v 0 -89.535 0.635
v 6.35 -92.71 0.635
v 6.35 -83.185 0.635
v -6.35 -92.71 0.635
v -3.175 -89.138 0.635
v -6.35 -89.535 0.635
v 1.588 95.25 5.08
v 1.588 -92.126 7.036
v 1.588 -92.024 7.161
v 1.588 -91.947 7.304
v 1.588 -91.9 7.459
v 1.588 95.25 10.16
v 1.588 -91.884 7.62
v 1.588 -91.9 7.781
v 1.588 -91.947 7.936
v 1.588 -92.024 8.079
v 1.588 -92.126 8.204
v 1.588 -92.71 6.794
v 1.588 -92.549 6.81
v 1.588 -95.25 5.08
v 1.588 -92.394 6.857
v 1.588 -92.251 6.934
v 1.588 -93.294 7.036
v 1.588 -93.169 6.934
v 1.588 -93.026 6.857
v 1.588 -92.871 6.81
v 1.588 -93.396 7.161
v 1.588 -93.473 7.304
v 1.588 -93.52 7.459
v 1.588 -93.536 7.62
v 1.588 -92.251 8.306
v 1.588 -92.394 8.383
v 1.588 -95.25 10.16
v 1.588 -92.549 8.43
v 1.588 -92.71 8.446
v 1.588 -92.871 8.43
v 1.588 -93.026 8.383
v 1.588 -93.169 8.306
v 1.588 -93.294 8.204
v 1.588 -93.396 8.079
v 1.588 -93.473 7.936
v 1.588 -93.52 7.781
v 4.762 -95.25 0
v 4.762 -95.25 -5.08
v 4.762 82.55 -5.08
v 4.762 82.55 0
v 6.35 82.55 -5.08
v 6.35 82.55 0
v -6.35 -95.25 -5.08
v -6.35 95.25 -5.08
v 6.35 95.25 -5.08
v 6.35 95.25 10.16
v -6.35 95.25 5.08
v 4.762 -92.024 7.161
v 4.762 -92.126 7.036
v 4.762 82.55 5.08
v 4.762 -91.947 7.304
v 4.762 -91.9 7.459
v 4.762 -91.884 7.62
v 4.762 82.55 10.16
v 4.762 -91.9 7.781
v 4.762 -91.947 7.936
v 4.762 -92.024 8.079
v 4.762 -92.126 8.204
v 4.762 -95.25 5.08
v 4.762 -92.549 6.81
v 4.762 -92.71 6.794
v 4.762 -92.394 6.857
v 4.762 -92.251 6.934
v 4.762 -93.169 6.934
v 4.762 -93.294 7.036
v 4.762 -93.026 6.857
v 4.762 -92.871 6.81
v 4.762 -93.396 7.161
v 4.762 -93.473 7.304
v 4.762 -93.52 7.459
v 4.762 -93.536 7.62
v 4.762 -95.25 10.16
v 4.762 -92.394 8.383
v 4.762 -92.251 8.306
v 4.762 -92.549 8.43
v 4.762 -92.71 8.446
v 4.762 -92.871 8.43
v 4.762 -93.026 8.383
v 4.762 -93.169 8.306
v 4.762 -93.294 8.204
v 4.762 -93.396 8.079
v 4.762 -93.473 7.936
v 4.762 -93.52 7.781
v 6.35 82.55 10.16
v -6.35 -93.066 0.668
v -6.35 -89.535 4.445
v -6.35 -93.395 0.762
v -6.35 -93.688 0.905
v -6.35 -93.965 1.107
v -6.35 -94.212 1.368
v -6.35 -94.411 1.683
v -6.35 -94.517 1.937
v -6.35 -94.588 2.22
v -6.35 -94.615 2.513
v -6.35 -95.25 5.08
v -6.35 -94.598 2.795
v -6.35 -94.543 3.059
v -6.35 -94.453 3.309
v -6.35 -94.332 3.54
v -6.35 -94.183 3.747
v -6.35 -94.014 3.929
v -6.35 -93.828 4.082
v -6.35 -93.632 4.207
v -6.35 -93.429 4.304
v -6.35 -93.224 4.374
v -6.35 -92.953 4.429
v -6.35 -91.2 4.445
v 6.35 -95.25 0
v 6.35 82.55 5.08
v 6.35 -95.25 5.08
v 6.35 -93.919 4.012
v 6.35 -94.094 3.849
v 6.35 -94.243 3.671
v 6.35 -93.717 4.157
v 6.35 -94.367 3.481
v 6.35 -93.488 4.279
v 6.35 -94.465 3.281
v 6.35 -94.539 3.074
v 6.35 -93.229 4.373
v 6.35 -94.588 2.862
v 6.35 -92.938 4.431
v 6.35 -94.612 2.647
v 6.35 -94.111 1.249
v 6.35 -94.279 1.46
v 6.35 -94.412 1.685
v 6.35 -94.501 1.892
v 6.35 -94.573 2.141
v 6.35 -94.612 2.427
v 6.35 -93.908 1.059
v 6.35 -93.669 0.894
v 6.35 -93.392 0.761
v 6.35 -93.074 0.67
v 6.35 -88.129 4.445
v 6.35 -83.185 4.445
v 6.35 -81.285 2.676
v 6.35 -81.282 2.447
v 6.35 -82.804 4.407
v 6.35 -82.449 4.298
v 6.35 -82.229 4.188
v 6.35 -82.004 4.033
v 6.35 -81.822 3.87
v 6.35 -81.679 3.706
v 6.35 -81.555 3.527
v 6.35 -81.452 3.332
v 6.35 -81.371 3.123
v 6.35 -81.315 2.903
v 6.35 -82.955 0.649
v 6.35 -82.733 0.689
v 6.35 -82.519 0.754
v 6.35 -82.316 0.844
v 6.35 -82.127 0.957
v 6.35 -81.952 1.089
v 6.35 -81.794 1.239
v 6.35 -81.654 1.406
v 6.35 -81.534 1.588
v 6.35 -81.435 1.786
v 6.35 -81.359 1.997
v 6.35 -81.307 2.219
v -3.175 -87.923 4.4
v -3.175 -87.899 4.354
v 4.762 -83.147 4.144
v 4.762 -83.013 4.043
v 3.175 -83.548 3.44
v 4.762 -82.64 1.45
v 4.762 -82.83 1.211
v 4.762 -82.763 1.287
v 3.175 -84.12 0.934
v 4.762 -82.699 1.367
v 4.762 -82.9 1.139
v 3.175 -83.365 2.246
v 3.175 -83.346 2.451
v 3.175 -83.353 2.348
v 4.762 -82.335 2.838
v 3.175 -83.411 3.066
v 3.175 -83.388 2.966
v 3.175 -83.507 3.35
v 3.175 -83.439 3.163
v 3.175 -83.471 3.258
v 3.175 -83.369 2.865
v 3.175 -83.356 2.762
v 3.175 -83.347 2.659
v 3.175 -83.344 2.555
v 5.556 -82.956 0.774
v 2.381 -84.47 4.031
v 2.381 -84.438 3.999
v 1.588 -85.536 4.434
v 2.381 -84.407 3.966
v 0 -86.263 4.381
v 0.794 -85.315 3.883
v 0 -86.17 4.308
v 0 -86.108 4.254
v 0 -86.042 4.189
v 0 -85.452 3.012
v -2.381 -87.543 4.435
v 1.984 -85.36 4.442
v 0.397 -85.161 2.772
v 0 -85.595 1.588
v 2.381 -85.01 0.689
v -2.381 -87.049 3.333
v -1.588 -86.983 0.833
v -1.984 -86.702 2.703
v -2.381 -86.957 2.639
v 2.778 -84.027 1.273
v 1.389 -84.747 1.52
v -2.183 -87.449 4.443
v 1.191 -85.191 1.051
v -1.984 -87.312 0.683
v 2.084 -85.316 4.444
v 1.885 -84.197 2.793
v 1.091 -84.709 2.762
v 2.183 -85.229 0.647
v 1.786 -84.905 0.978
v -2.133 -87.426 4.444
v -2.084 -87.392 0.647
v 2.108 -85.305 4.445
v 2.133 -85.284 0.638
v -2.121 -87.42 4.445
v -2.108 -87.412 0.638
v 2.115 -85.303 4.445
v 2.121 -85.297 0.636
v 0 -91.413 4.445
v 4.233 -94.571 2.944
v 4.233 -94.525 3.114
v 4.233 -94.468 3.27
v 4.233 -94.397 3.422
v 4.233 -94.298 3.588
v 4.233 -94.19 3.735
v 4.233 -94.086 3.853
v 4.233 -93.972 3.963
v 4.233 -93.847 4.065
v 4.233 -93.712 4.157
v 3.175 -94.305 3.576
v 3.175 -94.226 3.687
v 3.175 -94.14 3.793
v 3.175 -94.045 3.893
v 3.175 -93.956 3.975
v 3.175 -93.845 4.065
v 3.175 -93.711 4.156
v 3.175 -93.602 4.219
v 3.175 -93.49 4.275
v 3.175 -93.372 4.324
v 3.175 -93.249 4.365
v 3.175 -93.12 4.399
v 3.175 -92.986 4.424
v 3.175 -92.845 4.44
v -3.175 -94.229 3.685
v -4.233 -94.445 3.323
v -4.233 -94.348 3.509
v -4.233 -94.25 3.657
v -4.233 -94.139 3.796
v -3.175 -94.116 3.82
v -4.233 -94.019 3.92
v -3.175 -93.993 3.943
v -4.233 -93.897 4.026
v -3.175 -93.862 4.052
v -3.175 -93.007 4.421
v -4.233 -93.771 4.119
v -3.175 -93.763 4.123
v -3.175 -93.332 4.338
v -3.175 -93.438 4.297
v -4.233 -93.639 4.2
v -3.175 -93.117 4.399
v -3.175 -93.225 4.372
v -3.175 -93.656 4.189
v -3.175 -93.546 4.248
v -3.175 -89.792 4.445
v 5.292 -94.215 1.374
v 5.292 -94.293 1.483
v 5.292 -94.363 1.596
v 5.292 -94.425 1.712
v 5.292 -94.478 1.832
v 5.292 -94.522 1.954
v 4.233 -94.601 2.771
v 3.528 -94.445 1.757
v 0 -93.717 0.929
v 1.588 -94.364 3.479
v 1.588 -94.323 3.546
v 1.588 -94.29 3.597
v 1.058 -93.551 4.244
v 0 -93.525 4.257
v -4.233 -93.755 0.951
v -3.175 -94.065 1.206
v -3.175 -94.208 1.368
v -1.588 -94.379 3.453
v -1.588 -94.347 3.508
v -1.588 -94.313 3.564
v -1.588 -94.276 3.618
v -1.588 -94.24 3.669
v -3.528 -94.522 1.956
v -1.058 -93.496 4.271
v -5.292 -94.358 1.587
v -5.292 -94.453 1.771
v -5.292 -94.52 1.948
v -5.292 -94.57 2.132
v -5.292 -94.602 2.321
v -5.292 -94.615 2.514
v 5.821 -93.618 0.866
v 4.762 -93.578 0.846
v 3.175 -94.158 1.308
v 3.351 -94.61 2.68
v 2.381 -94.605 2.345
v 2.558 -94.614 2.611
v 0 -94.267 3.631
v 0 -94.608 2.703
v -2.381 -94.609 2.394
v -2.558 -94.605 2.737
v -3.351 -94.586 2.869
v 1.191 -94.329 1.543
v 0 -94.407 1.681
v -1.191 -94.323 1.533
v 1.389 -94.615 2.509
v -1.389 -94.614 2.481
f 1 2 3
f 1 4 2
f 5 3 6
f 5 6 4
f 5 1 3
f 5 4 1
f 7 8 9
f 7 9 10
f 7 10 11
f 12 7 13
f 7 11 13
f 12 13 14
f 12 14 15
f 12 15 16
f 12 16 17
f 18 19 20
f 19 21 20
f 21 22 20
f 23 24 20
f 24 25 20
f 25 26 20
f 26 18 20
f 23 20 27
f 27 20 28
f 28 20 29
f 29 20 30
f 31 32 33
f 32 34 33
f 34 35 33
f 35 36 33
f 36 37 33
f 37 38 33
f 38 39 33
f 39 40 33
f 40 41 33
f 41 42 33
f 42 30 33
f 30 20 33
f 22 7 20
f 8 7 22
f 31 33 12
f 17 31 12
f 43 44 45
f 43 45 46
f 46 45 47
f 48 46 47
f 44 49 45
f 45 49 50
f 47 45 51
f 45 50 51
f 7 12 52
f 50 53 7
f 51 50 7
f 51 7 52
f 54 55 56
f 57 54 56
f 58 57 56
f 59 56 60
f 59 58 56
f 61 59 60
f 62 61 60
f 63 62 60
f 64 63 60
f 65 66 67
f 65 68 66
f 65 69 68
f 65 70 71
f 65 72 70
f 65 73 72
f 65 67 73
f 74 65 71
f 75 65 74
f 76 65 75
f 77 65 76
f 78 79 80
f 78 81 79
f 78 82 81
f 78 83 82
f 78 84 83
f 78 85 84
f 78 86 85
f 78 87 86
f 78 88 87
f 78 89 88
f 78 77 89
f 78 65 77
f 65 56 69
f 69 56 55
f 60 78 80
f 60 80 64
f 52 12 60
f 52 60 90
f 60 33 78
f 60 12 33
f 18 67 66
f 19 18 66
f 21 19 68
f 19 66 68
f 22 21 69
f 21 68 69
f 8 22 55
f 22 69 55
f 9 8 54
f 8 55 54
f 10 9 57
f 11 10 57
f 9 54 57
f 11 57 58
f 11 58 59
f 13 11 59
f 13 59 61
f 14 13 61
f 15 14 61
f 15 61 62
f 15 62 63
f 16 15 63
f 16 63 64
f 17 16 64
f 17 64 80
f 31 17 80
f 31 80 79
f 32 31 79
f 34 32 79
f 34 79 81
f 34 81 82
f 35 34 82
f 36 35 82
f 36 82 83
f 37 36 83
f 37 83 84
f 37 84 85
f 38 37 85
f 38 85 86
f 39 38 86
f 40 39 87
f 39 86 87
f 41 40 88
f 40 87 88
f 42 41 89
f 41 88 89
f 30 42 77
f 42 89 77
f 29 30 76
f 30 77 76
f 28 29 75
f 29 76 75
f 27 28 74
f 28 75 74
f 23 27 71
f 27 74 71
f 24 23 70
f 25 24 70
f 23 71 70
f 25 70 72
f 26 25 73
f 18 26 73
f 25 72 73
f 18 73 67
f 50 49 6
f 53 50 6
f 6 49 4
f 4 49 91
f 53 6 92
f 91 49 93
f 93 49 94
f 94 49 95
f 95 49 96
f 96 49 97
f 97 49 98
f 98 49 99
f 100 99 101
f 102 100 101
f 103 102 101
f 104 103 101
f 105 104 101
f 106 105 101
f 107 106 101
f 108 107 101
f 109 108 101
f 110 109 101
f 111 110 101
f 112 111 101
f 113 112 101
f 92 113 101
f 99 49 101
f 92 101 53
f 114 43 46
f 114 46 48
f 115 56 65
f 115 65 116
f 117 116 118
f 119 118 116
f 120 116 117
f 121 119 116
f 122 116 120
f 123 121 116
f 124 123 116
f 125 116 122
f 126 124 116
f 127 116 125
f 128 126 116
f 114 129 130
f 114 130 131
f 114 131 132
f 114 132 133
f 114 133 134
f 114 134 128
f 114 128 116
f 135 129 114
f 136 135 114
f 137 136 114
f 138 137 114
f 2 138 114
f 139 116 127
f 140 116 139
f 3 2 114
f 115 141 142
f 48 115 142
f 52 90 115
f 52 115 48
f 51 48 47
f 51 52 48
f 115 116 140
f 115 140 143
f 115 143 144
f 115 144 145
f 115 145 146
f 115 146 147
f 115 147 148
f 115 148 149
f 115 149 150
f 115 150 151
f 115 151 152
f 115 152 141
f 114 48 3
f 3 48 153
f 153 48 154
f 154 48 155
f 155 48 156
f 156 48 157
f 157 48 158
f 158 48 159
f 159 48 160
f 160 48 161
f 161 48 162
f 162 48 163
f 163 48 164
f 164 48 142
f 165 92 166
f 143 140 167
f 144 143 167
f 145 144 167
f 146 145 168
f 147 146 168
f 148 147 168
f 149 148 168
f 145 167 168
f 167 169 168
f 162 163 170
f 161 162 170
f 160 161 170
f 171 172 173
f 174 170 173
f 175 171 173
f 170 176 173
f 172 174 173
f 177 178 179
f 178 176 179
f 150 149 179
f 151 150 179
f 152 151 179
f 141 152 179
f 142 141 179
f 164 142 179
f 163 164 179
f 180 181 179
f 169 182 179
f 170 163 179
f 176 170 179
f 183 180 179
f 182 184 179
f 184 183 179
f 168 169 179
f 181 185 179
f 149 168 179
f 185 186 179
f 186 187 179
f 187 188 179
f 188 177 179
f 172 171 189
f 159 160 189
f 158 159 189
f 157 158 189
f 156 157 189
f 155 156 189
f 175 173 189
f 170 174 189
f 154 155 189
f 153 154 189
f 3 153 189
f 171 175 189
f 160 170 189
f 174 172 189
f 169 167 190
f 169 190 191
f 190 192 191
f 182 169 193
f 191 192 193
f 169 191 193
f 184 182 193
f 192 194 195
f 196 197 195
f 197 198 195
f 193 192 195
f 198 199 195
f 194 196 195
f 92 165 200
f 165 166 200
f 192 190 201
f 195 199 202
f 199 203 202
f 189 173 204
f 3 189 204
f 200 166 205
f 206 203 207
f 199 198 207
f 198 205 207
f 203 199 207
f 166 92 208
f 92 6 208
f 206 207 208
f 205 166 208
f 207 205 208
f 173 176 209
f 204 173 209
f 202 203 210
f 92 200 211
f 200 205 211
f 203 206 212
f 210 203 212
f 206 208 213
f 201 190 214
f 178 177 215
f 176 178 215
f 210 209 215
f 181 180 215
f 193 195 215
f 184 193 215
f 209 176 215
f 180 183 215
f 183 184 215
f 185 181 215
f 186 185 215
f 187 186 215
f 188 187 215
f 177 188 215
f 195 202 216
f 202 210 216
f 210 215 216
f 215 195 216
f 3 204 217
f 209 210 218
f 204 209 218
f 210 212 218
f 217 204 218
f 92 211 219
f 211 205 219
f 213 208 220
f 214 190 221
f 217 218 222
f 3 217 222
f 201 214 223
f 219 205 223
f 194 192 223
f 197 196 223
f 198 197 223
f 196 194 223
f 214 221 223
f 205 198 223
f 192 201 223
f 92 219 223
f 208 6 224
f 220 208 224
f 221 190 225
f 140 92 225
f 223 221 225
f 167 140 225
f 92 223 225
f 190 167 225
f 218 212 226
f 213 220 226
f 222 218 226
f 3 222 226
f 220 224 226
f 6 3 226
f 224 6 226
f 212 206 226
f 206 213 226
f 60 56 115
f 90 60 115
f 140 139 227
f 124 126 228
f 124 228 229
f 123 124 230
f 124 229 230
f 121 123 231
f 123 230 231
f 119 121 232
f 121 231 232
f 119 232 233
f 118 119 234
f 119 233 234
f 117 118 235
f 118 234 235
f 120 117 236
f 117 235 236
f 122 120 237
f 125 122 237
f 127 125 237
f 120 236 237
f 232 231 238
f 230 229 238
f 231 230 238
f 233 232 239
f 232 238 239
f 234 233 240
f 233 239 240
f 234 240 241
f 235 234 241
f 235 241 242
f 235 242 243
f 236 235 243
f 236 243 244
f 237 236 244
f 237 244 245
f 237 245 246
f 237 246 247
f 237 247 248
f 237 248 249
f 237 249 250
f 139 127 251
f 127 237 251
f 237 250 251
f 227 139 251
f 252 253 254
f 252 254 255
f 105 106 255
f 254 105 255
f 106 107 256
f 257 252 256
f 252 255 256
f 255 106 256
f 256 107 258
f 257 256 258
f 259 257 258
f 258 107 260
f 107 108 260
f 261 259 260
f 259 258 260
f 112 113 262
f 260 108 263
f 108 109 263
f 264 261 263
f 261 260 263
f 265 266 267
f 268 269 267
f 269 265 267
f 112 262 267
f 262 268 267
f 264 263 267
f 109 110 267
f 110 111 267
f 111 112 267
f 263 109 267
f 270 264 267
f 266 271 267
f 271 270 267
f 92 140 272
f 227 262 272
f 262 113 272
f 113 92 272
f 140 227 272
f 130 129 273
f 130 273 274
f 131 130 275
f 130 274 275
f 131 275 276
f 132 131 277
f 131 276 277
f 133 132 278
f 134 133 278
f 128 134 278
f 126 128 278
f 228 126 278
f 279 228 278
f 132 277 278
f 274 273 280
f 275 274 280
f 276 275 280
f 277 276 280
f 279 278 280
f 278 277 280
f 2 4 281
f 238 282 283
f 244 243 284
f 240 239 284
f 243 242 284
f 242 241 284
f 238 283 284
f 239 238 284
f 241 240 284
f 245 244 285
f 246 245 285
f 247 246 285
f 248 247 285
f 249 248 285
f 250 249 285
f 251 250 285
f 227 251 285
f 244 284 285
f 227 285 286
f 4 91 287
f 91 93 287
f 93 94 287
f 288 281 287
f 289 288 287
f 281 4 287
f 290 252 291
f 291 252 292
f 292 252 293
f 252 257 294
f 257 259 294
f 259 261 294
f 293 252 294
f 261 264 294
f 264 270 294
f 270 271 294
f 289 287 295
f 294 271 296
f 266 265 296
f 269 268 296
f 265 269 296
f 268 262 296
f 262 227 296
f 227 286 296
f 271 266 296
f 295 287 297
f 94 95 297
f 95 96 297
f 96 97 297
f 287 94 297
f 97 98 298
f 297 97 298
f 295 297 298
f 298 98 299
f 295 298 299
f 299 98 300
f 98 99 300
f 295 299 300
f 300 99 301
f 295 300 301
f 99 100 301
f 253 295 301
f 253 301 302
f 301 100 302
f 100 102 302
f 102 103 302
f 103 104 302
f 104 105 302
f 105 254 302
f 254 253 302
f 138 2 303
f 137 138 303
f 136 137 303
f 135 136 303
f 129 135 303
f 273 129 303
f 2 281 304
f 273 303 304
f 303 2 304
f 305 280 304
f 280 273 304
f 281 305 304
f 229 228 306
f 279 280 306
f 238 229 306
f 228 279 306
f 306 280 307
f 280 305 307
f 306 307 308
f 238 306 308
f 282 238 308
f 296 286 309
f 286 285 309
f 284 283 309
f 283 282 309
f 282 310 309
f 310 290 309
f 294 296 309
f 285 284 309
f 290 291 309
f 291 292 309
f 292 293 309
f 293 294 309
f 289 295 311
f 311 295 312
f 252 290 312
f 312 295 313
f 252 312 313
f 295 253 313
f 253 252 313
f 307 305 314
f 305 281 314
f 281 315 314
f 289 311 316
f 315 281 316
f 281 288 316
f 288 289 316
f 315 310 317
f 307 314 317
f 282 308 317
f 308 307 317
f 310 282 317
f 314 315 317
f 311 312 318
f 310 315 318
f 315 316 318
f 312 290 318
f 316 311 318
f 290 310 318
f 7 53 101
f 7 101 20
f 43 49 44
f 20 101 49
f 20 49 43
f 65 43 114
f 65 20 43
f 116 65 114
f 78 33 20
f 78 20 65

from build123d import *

# Parameters (mm, degrees)
SKETCH1_W           = 12.7
SKETCH1_H           = 190.5
BOSS_EXTRUDE1_DEPTH = 5.08
SKETCH5_W           = 3.175
SKETCH5_H           = 5.08
SKETCH5_W_2         = 11.1125
BOSS_EXTRUDE2_DEPTH = 190.5
SKETCH6_R           = 0.8255
CUT_EXTRUDE1_DEPTH  = 97.432752618
SKETCH7_W           = 1.5875
SKETCH7_H           = 5.08
BOSS_EXTRUDE3_DEPTH = 12.7


with BuildPart() as part:
    # Sketch1 → Boss-Extrude1 (new body)
    with BuildSketch(Plane.XY):
        Rectangle(SKETCH1_W, SKETCH1_H)
    extrude(amount=BOSS_EXTRUDE1_DEPTH)

    # Cut-Loft1: read off the stored shape, not the designer's step
    # Cut-Loft1: loft between two sections, ruled curve by curve
    cut_loft1_from = [
        Edge.make_bspline([(6.35, -92.71, 0.635), (6.35, -92.880627047, 0.635), (6.35, -93.190295538, 0.679451635), (6.35, -93.580426831, 0.829875615), (6.35, -93.904017113, 1.040042177), (6.35, -94.252532736, 1.378638842), (6.35, -94.539016945, 1.880682246), (6.35, -94.652993182, 2.54), (6.35, -94.539016945, 3.199317754), (6.35, -94.252532736, 3.701361158), (6.35, -93.904017113, 4.039957823), (6.35, -93.580426831, 4.250124385), (6.35, -93.190295538, 4.400548365), (6.35, -92.880627047, 4.445), (6.35, -92.100030361, 4.445), (6.35, -90.729103522, 4.445), (6.35, -87.9475, 4.445), (6.35, -85.165896478, 4.445), (6.35, -83.794969639, 4.445), (6.35, -83.185, 4.445)], [0, 0, 0, 0, 0.033003864, 0.066007727, 0.099011591, 0.132015455, 0.198023182, 0.264030909, 0.330038636, 0.396046364, 0.429050227, 0.462054091, 0.495057954, 0.528061818, 0.528061818, 0.646046364, 0.764030909, 0.882015455, 1, 1, 1, 1], 3),
        Edge.make_bspline([(6.35, -83.185, 4.445), (6.35, -82.922150477, 4.445), (6.35, -82.421175953, 4.339900308), (6.35, -81.805369524, 3.916723034), (6.35, -81.386700238, 3.309409446), (6.35, -81.226649881, 2.54), (6.35, -81.386700238, 1.770590554), (6.35, -81.805369524, 1.163276966), (6.35, -82.421175953, 0.740099692), (6.35, -82.922150477, 0.635), (6.35, -83.185, 0.635)], [0, 0, 0, 0, 0.125, 0.25, 0.375, 0.5, 0.625, 0.75, 0.875, 1, 1, 1, 1], 3),
        Edge.make_line((6.35, -92.71, 0.635), (6.35, -83.185, 0.635)),
    ]
    cut_loft1_to = [
        Edge.make_bspline([(-6.35, -92.71, 0.635), (-6.35, -92.81076887, 0.635), (-6.35, -93.018481978, 0.65100327), (-6.35, -93.339219021, 0.731183475), (-6.35, -93.659764721, 0.875704473), (-6.35, -94.064204291, 1.159019535), (-6.35, -94.484151999, 1.692137872), (-6.35, -94.680912476, 2.54), (-6.35, -94.484151999, 3.387862128), (-6.35, -94.064204291, 3.920980465), (-6.35, -93.659764721, 4.204295527), (-6.35, -93.339219021, 4.348816525), (-6.35, -93.018481978, 4.42899673), (-6.35, -92.81076887, 4.445), (-6.35, -92.349764316, 4.445), (-6.35, -91.828550912, 4.445), (-6.35, -91.1225, 4.445), (-6.35, -90.416449088, 4.445), (-6.35, -89.895235684, 4.445), (-6.35, -89.535, 4.445)], [0, 0, 0, 0, 0.033003864, 0.066007727, 0.099011591, 0.132015455, 0.198023182, 0.264030909, 0.330038636, 0.396046364, 0.429050227, 0.462054091, 0.495057954, 0.528061818, 0.528061818, 0.646046364, 0.764030909, 0.882015455, 1, 1, 1, 1], 3),
        Edge.make_bspline([(-6.35, -89.535, 4.445), (-6.35, -89.535, 4.28625), (-6.35, -89.535, 3.96875), (-6.35, -89.535, 3.4925), (-6.35, -89.535, 3.01625), (-6.35, -89.535, 2.54), (-6.35, -89.535, 2.06375), (-6.35, -89.535, 1.5875), (-6.35, -89.535, 1.11125), (-6.35, -89.535, 0.79375), (-6.35, -89.535, 0.635)], [0, 0, 0, 0, 0.125, 0.25, 0.375, 0.5, 0.625, 0.75, 0.875, 1, 1, 1, 1], 3),
        Edge.make_line((-6.35, -92.71, 0.635), (-6.35, -89.535, 0.635)),
    ]
    cut_loft1 = Solid(Shell([*[Face.make_surface_from_curves(cut_loft1_from[k], cut_loft1_to[k]) for k in range(3)], Face(Wire(cut_loft1_from)), Face(Wire(cut_loft1_to))]))
    add(cut_loft1, mode=Mode.SUBTRACT)

    # Sketch5 → Boss-Extrude2 (add)
    with BuildSketch(Plane.XZ.offset(95.25)):
        with Locations((3.175, 7.62)):
            Rectangle(SKETCH5_W, SKETCH5_H)
        with Locations((-0.79375, -2.54)):
            Rectangle(SKETCH5_W_2, SKETCH5_H)
    extrude(amount=-BOSS_EXTRUDE2_DEPTH)

    # Sketch6 → Cut-Extrude1 (cut, through all)
    with BuildSketch(Plane(origin=(4.7625, 0, 0), x_dir=(0, 0, -1), z_dir=(1, 0, 0))):
        with Locations((-7.62, -92.71)):
            Circle(SKETCH6_R)
    extrude(amount=-CUT_EXTRUDE1_DEPTH, mode=Mode.SUBTRACT)

    # Sketch7 → Boss-Extrude3 (add)
    with BuildSketch(Plane(origin=(0, 95.25, 0), x_dir=(1, 0, 0), z_dir=(0, 1, 0))):
        with Locations((5.55625, 2.54)):
            Rectangle(SKETCH7_W, SKETCH7_H)
        with Locations((5.55625, -7.62)):
            Rectangle(SKETCH7_W, SKETCH7_H)
    extrude(amount=-BOSS_EXTRUDE3_DEPTH)


solid = part.part
